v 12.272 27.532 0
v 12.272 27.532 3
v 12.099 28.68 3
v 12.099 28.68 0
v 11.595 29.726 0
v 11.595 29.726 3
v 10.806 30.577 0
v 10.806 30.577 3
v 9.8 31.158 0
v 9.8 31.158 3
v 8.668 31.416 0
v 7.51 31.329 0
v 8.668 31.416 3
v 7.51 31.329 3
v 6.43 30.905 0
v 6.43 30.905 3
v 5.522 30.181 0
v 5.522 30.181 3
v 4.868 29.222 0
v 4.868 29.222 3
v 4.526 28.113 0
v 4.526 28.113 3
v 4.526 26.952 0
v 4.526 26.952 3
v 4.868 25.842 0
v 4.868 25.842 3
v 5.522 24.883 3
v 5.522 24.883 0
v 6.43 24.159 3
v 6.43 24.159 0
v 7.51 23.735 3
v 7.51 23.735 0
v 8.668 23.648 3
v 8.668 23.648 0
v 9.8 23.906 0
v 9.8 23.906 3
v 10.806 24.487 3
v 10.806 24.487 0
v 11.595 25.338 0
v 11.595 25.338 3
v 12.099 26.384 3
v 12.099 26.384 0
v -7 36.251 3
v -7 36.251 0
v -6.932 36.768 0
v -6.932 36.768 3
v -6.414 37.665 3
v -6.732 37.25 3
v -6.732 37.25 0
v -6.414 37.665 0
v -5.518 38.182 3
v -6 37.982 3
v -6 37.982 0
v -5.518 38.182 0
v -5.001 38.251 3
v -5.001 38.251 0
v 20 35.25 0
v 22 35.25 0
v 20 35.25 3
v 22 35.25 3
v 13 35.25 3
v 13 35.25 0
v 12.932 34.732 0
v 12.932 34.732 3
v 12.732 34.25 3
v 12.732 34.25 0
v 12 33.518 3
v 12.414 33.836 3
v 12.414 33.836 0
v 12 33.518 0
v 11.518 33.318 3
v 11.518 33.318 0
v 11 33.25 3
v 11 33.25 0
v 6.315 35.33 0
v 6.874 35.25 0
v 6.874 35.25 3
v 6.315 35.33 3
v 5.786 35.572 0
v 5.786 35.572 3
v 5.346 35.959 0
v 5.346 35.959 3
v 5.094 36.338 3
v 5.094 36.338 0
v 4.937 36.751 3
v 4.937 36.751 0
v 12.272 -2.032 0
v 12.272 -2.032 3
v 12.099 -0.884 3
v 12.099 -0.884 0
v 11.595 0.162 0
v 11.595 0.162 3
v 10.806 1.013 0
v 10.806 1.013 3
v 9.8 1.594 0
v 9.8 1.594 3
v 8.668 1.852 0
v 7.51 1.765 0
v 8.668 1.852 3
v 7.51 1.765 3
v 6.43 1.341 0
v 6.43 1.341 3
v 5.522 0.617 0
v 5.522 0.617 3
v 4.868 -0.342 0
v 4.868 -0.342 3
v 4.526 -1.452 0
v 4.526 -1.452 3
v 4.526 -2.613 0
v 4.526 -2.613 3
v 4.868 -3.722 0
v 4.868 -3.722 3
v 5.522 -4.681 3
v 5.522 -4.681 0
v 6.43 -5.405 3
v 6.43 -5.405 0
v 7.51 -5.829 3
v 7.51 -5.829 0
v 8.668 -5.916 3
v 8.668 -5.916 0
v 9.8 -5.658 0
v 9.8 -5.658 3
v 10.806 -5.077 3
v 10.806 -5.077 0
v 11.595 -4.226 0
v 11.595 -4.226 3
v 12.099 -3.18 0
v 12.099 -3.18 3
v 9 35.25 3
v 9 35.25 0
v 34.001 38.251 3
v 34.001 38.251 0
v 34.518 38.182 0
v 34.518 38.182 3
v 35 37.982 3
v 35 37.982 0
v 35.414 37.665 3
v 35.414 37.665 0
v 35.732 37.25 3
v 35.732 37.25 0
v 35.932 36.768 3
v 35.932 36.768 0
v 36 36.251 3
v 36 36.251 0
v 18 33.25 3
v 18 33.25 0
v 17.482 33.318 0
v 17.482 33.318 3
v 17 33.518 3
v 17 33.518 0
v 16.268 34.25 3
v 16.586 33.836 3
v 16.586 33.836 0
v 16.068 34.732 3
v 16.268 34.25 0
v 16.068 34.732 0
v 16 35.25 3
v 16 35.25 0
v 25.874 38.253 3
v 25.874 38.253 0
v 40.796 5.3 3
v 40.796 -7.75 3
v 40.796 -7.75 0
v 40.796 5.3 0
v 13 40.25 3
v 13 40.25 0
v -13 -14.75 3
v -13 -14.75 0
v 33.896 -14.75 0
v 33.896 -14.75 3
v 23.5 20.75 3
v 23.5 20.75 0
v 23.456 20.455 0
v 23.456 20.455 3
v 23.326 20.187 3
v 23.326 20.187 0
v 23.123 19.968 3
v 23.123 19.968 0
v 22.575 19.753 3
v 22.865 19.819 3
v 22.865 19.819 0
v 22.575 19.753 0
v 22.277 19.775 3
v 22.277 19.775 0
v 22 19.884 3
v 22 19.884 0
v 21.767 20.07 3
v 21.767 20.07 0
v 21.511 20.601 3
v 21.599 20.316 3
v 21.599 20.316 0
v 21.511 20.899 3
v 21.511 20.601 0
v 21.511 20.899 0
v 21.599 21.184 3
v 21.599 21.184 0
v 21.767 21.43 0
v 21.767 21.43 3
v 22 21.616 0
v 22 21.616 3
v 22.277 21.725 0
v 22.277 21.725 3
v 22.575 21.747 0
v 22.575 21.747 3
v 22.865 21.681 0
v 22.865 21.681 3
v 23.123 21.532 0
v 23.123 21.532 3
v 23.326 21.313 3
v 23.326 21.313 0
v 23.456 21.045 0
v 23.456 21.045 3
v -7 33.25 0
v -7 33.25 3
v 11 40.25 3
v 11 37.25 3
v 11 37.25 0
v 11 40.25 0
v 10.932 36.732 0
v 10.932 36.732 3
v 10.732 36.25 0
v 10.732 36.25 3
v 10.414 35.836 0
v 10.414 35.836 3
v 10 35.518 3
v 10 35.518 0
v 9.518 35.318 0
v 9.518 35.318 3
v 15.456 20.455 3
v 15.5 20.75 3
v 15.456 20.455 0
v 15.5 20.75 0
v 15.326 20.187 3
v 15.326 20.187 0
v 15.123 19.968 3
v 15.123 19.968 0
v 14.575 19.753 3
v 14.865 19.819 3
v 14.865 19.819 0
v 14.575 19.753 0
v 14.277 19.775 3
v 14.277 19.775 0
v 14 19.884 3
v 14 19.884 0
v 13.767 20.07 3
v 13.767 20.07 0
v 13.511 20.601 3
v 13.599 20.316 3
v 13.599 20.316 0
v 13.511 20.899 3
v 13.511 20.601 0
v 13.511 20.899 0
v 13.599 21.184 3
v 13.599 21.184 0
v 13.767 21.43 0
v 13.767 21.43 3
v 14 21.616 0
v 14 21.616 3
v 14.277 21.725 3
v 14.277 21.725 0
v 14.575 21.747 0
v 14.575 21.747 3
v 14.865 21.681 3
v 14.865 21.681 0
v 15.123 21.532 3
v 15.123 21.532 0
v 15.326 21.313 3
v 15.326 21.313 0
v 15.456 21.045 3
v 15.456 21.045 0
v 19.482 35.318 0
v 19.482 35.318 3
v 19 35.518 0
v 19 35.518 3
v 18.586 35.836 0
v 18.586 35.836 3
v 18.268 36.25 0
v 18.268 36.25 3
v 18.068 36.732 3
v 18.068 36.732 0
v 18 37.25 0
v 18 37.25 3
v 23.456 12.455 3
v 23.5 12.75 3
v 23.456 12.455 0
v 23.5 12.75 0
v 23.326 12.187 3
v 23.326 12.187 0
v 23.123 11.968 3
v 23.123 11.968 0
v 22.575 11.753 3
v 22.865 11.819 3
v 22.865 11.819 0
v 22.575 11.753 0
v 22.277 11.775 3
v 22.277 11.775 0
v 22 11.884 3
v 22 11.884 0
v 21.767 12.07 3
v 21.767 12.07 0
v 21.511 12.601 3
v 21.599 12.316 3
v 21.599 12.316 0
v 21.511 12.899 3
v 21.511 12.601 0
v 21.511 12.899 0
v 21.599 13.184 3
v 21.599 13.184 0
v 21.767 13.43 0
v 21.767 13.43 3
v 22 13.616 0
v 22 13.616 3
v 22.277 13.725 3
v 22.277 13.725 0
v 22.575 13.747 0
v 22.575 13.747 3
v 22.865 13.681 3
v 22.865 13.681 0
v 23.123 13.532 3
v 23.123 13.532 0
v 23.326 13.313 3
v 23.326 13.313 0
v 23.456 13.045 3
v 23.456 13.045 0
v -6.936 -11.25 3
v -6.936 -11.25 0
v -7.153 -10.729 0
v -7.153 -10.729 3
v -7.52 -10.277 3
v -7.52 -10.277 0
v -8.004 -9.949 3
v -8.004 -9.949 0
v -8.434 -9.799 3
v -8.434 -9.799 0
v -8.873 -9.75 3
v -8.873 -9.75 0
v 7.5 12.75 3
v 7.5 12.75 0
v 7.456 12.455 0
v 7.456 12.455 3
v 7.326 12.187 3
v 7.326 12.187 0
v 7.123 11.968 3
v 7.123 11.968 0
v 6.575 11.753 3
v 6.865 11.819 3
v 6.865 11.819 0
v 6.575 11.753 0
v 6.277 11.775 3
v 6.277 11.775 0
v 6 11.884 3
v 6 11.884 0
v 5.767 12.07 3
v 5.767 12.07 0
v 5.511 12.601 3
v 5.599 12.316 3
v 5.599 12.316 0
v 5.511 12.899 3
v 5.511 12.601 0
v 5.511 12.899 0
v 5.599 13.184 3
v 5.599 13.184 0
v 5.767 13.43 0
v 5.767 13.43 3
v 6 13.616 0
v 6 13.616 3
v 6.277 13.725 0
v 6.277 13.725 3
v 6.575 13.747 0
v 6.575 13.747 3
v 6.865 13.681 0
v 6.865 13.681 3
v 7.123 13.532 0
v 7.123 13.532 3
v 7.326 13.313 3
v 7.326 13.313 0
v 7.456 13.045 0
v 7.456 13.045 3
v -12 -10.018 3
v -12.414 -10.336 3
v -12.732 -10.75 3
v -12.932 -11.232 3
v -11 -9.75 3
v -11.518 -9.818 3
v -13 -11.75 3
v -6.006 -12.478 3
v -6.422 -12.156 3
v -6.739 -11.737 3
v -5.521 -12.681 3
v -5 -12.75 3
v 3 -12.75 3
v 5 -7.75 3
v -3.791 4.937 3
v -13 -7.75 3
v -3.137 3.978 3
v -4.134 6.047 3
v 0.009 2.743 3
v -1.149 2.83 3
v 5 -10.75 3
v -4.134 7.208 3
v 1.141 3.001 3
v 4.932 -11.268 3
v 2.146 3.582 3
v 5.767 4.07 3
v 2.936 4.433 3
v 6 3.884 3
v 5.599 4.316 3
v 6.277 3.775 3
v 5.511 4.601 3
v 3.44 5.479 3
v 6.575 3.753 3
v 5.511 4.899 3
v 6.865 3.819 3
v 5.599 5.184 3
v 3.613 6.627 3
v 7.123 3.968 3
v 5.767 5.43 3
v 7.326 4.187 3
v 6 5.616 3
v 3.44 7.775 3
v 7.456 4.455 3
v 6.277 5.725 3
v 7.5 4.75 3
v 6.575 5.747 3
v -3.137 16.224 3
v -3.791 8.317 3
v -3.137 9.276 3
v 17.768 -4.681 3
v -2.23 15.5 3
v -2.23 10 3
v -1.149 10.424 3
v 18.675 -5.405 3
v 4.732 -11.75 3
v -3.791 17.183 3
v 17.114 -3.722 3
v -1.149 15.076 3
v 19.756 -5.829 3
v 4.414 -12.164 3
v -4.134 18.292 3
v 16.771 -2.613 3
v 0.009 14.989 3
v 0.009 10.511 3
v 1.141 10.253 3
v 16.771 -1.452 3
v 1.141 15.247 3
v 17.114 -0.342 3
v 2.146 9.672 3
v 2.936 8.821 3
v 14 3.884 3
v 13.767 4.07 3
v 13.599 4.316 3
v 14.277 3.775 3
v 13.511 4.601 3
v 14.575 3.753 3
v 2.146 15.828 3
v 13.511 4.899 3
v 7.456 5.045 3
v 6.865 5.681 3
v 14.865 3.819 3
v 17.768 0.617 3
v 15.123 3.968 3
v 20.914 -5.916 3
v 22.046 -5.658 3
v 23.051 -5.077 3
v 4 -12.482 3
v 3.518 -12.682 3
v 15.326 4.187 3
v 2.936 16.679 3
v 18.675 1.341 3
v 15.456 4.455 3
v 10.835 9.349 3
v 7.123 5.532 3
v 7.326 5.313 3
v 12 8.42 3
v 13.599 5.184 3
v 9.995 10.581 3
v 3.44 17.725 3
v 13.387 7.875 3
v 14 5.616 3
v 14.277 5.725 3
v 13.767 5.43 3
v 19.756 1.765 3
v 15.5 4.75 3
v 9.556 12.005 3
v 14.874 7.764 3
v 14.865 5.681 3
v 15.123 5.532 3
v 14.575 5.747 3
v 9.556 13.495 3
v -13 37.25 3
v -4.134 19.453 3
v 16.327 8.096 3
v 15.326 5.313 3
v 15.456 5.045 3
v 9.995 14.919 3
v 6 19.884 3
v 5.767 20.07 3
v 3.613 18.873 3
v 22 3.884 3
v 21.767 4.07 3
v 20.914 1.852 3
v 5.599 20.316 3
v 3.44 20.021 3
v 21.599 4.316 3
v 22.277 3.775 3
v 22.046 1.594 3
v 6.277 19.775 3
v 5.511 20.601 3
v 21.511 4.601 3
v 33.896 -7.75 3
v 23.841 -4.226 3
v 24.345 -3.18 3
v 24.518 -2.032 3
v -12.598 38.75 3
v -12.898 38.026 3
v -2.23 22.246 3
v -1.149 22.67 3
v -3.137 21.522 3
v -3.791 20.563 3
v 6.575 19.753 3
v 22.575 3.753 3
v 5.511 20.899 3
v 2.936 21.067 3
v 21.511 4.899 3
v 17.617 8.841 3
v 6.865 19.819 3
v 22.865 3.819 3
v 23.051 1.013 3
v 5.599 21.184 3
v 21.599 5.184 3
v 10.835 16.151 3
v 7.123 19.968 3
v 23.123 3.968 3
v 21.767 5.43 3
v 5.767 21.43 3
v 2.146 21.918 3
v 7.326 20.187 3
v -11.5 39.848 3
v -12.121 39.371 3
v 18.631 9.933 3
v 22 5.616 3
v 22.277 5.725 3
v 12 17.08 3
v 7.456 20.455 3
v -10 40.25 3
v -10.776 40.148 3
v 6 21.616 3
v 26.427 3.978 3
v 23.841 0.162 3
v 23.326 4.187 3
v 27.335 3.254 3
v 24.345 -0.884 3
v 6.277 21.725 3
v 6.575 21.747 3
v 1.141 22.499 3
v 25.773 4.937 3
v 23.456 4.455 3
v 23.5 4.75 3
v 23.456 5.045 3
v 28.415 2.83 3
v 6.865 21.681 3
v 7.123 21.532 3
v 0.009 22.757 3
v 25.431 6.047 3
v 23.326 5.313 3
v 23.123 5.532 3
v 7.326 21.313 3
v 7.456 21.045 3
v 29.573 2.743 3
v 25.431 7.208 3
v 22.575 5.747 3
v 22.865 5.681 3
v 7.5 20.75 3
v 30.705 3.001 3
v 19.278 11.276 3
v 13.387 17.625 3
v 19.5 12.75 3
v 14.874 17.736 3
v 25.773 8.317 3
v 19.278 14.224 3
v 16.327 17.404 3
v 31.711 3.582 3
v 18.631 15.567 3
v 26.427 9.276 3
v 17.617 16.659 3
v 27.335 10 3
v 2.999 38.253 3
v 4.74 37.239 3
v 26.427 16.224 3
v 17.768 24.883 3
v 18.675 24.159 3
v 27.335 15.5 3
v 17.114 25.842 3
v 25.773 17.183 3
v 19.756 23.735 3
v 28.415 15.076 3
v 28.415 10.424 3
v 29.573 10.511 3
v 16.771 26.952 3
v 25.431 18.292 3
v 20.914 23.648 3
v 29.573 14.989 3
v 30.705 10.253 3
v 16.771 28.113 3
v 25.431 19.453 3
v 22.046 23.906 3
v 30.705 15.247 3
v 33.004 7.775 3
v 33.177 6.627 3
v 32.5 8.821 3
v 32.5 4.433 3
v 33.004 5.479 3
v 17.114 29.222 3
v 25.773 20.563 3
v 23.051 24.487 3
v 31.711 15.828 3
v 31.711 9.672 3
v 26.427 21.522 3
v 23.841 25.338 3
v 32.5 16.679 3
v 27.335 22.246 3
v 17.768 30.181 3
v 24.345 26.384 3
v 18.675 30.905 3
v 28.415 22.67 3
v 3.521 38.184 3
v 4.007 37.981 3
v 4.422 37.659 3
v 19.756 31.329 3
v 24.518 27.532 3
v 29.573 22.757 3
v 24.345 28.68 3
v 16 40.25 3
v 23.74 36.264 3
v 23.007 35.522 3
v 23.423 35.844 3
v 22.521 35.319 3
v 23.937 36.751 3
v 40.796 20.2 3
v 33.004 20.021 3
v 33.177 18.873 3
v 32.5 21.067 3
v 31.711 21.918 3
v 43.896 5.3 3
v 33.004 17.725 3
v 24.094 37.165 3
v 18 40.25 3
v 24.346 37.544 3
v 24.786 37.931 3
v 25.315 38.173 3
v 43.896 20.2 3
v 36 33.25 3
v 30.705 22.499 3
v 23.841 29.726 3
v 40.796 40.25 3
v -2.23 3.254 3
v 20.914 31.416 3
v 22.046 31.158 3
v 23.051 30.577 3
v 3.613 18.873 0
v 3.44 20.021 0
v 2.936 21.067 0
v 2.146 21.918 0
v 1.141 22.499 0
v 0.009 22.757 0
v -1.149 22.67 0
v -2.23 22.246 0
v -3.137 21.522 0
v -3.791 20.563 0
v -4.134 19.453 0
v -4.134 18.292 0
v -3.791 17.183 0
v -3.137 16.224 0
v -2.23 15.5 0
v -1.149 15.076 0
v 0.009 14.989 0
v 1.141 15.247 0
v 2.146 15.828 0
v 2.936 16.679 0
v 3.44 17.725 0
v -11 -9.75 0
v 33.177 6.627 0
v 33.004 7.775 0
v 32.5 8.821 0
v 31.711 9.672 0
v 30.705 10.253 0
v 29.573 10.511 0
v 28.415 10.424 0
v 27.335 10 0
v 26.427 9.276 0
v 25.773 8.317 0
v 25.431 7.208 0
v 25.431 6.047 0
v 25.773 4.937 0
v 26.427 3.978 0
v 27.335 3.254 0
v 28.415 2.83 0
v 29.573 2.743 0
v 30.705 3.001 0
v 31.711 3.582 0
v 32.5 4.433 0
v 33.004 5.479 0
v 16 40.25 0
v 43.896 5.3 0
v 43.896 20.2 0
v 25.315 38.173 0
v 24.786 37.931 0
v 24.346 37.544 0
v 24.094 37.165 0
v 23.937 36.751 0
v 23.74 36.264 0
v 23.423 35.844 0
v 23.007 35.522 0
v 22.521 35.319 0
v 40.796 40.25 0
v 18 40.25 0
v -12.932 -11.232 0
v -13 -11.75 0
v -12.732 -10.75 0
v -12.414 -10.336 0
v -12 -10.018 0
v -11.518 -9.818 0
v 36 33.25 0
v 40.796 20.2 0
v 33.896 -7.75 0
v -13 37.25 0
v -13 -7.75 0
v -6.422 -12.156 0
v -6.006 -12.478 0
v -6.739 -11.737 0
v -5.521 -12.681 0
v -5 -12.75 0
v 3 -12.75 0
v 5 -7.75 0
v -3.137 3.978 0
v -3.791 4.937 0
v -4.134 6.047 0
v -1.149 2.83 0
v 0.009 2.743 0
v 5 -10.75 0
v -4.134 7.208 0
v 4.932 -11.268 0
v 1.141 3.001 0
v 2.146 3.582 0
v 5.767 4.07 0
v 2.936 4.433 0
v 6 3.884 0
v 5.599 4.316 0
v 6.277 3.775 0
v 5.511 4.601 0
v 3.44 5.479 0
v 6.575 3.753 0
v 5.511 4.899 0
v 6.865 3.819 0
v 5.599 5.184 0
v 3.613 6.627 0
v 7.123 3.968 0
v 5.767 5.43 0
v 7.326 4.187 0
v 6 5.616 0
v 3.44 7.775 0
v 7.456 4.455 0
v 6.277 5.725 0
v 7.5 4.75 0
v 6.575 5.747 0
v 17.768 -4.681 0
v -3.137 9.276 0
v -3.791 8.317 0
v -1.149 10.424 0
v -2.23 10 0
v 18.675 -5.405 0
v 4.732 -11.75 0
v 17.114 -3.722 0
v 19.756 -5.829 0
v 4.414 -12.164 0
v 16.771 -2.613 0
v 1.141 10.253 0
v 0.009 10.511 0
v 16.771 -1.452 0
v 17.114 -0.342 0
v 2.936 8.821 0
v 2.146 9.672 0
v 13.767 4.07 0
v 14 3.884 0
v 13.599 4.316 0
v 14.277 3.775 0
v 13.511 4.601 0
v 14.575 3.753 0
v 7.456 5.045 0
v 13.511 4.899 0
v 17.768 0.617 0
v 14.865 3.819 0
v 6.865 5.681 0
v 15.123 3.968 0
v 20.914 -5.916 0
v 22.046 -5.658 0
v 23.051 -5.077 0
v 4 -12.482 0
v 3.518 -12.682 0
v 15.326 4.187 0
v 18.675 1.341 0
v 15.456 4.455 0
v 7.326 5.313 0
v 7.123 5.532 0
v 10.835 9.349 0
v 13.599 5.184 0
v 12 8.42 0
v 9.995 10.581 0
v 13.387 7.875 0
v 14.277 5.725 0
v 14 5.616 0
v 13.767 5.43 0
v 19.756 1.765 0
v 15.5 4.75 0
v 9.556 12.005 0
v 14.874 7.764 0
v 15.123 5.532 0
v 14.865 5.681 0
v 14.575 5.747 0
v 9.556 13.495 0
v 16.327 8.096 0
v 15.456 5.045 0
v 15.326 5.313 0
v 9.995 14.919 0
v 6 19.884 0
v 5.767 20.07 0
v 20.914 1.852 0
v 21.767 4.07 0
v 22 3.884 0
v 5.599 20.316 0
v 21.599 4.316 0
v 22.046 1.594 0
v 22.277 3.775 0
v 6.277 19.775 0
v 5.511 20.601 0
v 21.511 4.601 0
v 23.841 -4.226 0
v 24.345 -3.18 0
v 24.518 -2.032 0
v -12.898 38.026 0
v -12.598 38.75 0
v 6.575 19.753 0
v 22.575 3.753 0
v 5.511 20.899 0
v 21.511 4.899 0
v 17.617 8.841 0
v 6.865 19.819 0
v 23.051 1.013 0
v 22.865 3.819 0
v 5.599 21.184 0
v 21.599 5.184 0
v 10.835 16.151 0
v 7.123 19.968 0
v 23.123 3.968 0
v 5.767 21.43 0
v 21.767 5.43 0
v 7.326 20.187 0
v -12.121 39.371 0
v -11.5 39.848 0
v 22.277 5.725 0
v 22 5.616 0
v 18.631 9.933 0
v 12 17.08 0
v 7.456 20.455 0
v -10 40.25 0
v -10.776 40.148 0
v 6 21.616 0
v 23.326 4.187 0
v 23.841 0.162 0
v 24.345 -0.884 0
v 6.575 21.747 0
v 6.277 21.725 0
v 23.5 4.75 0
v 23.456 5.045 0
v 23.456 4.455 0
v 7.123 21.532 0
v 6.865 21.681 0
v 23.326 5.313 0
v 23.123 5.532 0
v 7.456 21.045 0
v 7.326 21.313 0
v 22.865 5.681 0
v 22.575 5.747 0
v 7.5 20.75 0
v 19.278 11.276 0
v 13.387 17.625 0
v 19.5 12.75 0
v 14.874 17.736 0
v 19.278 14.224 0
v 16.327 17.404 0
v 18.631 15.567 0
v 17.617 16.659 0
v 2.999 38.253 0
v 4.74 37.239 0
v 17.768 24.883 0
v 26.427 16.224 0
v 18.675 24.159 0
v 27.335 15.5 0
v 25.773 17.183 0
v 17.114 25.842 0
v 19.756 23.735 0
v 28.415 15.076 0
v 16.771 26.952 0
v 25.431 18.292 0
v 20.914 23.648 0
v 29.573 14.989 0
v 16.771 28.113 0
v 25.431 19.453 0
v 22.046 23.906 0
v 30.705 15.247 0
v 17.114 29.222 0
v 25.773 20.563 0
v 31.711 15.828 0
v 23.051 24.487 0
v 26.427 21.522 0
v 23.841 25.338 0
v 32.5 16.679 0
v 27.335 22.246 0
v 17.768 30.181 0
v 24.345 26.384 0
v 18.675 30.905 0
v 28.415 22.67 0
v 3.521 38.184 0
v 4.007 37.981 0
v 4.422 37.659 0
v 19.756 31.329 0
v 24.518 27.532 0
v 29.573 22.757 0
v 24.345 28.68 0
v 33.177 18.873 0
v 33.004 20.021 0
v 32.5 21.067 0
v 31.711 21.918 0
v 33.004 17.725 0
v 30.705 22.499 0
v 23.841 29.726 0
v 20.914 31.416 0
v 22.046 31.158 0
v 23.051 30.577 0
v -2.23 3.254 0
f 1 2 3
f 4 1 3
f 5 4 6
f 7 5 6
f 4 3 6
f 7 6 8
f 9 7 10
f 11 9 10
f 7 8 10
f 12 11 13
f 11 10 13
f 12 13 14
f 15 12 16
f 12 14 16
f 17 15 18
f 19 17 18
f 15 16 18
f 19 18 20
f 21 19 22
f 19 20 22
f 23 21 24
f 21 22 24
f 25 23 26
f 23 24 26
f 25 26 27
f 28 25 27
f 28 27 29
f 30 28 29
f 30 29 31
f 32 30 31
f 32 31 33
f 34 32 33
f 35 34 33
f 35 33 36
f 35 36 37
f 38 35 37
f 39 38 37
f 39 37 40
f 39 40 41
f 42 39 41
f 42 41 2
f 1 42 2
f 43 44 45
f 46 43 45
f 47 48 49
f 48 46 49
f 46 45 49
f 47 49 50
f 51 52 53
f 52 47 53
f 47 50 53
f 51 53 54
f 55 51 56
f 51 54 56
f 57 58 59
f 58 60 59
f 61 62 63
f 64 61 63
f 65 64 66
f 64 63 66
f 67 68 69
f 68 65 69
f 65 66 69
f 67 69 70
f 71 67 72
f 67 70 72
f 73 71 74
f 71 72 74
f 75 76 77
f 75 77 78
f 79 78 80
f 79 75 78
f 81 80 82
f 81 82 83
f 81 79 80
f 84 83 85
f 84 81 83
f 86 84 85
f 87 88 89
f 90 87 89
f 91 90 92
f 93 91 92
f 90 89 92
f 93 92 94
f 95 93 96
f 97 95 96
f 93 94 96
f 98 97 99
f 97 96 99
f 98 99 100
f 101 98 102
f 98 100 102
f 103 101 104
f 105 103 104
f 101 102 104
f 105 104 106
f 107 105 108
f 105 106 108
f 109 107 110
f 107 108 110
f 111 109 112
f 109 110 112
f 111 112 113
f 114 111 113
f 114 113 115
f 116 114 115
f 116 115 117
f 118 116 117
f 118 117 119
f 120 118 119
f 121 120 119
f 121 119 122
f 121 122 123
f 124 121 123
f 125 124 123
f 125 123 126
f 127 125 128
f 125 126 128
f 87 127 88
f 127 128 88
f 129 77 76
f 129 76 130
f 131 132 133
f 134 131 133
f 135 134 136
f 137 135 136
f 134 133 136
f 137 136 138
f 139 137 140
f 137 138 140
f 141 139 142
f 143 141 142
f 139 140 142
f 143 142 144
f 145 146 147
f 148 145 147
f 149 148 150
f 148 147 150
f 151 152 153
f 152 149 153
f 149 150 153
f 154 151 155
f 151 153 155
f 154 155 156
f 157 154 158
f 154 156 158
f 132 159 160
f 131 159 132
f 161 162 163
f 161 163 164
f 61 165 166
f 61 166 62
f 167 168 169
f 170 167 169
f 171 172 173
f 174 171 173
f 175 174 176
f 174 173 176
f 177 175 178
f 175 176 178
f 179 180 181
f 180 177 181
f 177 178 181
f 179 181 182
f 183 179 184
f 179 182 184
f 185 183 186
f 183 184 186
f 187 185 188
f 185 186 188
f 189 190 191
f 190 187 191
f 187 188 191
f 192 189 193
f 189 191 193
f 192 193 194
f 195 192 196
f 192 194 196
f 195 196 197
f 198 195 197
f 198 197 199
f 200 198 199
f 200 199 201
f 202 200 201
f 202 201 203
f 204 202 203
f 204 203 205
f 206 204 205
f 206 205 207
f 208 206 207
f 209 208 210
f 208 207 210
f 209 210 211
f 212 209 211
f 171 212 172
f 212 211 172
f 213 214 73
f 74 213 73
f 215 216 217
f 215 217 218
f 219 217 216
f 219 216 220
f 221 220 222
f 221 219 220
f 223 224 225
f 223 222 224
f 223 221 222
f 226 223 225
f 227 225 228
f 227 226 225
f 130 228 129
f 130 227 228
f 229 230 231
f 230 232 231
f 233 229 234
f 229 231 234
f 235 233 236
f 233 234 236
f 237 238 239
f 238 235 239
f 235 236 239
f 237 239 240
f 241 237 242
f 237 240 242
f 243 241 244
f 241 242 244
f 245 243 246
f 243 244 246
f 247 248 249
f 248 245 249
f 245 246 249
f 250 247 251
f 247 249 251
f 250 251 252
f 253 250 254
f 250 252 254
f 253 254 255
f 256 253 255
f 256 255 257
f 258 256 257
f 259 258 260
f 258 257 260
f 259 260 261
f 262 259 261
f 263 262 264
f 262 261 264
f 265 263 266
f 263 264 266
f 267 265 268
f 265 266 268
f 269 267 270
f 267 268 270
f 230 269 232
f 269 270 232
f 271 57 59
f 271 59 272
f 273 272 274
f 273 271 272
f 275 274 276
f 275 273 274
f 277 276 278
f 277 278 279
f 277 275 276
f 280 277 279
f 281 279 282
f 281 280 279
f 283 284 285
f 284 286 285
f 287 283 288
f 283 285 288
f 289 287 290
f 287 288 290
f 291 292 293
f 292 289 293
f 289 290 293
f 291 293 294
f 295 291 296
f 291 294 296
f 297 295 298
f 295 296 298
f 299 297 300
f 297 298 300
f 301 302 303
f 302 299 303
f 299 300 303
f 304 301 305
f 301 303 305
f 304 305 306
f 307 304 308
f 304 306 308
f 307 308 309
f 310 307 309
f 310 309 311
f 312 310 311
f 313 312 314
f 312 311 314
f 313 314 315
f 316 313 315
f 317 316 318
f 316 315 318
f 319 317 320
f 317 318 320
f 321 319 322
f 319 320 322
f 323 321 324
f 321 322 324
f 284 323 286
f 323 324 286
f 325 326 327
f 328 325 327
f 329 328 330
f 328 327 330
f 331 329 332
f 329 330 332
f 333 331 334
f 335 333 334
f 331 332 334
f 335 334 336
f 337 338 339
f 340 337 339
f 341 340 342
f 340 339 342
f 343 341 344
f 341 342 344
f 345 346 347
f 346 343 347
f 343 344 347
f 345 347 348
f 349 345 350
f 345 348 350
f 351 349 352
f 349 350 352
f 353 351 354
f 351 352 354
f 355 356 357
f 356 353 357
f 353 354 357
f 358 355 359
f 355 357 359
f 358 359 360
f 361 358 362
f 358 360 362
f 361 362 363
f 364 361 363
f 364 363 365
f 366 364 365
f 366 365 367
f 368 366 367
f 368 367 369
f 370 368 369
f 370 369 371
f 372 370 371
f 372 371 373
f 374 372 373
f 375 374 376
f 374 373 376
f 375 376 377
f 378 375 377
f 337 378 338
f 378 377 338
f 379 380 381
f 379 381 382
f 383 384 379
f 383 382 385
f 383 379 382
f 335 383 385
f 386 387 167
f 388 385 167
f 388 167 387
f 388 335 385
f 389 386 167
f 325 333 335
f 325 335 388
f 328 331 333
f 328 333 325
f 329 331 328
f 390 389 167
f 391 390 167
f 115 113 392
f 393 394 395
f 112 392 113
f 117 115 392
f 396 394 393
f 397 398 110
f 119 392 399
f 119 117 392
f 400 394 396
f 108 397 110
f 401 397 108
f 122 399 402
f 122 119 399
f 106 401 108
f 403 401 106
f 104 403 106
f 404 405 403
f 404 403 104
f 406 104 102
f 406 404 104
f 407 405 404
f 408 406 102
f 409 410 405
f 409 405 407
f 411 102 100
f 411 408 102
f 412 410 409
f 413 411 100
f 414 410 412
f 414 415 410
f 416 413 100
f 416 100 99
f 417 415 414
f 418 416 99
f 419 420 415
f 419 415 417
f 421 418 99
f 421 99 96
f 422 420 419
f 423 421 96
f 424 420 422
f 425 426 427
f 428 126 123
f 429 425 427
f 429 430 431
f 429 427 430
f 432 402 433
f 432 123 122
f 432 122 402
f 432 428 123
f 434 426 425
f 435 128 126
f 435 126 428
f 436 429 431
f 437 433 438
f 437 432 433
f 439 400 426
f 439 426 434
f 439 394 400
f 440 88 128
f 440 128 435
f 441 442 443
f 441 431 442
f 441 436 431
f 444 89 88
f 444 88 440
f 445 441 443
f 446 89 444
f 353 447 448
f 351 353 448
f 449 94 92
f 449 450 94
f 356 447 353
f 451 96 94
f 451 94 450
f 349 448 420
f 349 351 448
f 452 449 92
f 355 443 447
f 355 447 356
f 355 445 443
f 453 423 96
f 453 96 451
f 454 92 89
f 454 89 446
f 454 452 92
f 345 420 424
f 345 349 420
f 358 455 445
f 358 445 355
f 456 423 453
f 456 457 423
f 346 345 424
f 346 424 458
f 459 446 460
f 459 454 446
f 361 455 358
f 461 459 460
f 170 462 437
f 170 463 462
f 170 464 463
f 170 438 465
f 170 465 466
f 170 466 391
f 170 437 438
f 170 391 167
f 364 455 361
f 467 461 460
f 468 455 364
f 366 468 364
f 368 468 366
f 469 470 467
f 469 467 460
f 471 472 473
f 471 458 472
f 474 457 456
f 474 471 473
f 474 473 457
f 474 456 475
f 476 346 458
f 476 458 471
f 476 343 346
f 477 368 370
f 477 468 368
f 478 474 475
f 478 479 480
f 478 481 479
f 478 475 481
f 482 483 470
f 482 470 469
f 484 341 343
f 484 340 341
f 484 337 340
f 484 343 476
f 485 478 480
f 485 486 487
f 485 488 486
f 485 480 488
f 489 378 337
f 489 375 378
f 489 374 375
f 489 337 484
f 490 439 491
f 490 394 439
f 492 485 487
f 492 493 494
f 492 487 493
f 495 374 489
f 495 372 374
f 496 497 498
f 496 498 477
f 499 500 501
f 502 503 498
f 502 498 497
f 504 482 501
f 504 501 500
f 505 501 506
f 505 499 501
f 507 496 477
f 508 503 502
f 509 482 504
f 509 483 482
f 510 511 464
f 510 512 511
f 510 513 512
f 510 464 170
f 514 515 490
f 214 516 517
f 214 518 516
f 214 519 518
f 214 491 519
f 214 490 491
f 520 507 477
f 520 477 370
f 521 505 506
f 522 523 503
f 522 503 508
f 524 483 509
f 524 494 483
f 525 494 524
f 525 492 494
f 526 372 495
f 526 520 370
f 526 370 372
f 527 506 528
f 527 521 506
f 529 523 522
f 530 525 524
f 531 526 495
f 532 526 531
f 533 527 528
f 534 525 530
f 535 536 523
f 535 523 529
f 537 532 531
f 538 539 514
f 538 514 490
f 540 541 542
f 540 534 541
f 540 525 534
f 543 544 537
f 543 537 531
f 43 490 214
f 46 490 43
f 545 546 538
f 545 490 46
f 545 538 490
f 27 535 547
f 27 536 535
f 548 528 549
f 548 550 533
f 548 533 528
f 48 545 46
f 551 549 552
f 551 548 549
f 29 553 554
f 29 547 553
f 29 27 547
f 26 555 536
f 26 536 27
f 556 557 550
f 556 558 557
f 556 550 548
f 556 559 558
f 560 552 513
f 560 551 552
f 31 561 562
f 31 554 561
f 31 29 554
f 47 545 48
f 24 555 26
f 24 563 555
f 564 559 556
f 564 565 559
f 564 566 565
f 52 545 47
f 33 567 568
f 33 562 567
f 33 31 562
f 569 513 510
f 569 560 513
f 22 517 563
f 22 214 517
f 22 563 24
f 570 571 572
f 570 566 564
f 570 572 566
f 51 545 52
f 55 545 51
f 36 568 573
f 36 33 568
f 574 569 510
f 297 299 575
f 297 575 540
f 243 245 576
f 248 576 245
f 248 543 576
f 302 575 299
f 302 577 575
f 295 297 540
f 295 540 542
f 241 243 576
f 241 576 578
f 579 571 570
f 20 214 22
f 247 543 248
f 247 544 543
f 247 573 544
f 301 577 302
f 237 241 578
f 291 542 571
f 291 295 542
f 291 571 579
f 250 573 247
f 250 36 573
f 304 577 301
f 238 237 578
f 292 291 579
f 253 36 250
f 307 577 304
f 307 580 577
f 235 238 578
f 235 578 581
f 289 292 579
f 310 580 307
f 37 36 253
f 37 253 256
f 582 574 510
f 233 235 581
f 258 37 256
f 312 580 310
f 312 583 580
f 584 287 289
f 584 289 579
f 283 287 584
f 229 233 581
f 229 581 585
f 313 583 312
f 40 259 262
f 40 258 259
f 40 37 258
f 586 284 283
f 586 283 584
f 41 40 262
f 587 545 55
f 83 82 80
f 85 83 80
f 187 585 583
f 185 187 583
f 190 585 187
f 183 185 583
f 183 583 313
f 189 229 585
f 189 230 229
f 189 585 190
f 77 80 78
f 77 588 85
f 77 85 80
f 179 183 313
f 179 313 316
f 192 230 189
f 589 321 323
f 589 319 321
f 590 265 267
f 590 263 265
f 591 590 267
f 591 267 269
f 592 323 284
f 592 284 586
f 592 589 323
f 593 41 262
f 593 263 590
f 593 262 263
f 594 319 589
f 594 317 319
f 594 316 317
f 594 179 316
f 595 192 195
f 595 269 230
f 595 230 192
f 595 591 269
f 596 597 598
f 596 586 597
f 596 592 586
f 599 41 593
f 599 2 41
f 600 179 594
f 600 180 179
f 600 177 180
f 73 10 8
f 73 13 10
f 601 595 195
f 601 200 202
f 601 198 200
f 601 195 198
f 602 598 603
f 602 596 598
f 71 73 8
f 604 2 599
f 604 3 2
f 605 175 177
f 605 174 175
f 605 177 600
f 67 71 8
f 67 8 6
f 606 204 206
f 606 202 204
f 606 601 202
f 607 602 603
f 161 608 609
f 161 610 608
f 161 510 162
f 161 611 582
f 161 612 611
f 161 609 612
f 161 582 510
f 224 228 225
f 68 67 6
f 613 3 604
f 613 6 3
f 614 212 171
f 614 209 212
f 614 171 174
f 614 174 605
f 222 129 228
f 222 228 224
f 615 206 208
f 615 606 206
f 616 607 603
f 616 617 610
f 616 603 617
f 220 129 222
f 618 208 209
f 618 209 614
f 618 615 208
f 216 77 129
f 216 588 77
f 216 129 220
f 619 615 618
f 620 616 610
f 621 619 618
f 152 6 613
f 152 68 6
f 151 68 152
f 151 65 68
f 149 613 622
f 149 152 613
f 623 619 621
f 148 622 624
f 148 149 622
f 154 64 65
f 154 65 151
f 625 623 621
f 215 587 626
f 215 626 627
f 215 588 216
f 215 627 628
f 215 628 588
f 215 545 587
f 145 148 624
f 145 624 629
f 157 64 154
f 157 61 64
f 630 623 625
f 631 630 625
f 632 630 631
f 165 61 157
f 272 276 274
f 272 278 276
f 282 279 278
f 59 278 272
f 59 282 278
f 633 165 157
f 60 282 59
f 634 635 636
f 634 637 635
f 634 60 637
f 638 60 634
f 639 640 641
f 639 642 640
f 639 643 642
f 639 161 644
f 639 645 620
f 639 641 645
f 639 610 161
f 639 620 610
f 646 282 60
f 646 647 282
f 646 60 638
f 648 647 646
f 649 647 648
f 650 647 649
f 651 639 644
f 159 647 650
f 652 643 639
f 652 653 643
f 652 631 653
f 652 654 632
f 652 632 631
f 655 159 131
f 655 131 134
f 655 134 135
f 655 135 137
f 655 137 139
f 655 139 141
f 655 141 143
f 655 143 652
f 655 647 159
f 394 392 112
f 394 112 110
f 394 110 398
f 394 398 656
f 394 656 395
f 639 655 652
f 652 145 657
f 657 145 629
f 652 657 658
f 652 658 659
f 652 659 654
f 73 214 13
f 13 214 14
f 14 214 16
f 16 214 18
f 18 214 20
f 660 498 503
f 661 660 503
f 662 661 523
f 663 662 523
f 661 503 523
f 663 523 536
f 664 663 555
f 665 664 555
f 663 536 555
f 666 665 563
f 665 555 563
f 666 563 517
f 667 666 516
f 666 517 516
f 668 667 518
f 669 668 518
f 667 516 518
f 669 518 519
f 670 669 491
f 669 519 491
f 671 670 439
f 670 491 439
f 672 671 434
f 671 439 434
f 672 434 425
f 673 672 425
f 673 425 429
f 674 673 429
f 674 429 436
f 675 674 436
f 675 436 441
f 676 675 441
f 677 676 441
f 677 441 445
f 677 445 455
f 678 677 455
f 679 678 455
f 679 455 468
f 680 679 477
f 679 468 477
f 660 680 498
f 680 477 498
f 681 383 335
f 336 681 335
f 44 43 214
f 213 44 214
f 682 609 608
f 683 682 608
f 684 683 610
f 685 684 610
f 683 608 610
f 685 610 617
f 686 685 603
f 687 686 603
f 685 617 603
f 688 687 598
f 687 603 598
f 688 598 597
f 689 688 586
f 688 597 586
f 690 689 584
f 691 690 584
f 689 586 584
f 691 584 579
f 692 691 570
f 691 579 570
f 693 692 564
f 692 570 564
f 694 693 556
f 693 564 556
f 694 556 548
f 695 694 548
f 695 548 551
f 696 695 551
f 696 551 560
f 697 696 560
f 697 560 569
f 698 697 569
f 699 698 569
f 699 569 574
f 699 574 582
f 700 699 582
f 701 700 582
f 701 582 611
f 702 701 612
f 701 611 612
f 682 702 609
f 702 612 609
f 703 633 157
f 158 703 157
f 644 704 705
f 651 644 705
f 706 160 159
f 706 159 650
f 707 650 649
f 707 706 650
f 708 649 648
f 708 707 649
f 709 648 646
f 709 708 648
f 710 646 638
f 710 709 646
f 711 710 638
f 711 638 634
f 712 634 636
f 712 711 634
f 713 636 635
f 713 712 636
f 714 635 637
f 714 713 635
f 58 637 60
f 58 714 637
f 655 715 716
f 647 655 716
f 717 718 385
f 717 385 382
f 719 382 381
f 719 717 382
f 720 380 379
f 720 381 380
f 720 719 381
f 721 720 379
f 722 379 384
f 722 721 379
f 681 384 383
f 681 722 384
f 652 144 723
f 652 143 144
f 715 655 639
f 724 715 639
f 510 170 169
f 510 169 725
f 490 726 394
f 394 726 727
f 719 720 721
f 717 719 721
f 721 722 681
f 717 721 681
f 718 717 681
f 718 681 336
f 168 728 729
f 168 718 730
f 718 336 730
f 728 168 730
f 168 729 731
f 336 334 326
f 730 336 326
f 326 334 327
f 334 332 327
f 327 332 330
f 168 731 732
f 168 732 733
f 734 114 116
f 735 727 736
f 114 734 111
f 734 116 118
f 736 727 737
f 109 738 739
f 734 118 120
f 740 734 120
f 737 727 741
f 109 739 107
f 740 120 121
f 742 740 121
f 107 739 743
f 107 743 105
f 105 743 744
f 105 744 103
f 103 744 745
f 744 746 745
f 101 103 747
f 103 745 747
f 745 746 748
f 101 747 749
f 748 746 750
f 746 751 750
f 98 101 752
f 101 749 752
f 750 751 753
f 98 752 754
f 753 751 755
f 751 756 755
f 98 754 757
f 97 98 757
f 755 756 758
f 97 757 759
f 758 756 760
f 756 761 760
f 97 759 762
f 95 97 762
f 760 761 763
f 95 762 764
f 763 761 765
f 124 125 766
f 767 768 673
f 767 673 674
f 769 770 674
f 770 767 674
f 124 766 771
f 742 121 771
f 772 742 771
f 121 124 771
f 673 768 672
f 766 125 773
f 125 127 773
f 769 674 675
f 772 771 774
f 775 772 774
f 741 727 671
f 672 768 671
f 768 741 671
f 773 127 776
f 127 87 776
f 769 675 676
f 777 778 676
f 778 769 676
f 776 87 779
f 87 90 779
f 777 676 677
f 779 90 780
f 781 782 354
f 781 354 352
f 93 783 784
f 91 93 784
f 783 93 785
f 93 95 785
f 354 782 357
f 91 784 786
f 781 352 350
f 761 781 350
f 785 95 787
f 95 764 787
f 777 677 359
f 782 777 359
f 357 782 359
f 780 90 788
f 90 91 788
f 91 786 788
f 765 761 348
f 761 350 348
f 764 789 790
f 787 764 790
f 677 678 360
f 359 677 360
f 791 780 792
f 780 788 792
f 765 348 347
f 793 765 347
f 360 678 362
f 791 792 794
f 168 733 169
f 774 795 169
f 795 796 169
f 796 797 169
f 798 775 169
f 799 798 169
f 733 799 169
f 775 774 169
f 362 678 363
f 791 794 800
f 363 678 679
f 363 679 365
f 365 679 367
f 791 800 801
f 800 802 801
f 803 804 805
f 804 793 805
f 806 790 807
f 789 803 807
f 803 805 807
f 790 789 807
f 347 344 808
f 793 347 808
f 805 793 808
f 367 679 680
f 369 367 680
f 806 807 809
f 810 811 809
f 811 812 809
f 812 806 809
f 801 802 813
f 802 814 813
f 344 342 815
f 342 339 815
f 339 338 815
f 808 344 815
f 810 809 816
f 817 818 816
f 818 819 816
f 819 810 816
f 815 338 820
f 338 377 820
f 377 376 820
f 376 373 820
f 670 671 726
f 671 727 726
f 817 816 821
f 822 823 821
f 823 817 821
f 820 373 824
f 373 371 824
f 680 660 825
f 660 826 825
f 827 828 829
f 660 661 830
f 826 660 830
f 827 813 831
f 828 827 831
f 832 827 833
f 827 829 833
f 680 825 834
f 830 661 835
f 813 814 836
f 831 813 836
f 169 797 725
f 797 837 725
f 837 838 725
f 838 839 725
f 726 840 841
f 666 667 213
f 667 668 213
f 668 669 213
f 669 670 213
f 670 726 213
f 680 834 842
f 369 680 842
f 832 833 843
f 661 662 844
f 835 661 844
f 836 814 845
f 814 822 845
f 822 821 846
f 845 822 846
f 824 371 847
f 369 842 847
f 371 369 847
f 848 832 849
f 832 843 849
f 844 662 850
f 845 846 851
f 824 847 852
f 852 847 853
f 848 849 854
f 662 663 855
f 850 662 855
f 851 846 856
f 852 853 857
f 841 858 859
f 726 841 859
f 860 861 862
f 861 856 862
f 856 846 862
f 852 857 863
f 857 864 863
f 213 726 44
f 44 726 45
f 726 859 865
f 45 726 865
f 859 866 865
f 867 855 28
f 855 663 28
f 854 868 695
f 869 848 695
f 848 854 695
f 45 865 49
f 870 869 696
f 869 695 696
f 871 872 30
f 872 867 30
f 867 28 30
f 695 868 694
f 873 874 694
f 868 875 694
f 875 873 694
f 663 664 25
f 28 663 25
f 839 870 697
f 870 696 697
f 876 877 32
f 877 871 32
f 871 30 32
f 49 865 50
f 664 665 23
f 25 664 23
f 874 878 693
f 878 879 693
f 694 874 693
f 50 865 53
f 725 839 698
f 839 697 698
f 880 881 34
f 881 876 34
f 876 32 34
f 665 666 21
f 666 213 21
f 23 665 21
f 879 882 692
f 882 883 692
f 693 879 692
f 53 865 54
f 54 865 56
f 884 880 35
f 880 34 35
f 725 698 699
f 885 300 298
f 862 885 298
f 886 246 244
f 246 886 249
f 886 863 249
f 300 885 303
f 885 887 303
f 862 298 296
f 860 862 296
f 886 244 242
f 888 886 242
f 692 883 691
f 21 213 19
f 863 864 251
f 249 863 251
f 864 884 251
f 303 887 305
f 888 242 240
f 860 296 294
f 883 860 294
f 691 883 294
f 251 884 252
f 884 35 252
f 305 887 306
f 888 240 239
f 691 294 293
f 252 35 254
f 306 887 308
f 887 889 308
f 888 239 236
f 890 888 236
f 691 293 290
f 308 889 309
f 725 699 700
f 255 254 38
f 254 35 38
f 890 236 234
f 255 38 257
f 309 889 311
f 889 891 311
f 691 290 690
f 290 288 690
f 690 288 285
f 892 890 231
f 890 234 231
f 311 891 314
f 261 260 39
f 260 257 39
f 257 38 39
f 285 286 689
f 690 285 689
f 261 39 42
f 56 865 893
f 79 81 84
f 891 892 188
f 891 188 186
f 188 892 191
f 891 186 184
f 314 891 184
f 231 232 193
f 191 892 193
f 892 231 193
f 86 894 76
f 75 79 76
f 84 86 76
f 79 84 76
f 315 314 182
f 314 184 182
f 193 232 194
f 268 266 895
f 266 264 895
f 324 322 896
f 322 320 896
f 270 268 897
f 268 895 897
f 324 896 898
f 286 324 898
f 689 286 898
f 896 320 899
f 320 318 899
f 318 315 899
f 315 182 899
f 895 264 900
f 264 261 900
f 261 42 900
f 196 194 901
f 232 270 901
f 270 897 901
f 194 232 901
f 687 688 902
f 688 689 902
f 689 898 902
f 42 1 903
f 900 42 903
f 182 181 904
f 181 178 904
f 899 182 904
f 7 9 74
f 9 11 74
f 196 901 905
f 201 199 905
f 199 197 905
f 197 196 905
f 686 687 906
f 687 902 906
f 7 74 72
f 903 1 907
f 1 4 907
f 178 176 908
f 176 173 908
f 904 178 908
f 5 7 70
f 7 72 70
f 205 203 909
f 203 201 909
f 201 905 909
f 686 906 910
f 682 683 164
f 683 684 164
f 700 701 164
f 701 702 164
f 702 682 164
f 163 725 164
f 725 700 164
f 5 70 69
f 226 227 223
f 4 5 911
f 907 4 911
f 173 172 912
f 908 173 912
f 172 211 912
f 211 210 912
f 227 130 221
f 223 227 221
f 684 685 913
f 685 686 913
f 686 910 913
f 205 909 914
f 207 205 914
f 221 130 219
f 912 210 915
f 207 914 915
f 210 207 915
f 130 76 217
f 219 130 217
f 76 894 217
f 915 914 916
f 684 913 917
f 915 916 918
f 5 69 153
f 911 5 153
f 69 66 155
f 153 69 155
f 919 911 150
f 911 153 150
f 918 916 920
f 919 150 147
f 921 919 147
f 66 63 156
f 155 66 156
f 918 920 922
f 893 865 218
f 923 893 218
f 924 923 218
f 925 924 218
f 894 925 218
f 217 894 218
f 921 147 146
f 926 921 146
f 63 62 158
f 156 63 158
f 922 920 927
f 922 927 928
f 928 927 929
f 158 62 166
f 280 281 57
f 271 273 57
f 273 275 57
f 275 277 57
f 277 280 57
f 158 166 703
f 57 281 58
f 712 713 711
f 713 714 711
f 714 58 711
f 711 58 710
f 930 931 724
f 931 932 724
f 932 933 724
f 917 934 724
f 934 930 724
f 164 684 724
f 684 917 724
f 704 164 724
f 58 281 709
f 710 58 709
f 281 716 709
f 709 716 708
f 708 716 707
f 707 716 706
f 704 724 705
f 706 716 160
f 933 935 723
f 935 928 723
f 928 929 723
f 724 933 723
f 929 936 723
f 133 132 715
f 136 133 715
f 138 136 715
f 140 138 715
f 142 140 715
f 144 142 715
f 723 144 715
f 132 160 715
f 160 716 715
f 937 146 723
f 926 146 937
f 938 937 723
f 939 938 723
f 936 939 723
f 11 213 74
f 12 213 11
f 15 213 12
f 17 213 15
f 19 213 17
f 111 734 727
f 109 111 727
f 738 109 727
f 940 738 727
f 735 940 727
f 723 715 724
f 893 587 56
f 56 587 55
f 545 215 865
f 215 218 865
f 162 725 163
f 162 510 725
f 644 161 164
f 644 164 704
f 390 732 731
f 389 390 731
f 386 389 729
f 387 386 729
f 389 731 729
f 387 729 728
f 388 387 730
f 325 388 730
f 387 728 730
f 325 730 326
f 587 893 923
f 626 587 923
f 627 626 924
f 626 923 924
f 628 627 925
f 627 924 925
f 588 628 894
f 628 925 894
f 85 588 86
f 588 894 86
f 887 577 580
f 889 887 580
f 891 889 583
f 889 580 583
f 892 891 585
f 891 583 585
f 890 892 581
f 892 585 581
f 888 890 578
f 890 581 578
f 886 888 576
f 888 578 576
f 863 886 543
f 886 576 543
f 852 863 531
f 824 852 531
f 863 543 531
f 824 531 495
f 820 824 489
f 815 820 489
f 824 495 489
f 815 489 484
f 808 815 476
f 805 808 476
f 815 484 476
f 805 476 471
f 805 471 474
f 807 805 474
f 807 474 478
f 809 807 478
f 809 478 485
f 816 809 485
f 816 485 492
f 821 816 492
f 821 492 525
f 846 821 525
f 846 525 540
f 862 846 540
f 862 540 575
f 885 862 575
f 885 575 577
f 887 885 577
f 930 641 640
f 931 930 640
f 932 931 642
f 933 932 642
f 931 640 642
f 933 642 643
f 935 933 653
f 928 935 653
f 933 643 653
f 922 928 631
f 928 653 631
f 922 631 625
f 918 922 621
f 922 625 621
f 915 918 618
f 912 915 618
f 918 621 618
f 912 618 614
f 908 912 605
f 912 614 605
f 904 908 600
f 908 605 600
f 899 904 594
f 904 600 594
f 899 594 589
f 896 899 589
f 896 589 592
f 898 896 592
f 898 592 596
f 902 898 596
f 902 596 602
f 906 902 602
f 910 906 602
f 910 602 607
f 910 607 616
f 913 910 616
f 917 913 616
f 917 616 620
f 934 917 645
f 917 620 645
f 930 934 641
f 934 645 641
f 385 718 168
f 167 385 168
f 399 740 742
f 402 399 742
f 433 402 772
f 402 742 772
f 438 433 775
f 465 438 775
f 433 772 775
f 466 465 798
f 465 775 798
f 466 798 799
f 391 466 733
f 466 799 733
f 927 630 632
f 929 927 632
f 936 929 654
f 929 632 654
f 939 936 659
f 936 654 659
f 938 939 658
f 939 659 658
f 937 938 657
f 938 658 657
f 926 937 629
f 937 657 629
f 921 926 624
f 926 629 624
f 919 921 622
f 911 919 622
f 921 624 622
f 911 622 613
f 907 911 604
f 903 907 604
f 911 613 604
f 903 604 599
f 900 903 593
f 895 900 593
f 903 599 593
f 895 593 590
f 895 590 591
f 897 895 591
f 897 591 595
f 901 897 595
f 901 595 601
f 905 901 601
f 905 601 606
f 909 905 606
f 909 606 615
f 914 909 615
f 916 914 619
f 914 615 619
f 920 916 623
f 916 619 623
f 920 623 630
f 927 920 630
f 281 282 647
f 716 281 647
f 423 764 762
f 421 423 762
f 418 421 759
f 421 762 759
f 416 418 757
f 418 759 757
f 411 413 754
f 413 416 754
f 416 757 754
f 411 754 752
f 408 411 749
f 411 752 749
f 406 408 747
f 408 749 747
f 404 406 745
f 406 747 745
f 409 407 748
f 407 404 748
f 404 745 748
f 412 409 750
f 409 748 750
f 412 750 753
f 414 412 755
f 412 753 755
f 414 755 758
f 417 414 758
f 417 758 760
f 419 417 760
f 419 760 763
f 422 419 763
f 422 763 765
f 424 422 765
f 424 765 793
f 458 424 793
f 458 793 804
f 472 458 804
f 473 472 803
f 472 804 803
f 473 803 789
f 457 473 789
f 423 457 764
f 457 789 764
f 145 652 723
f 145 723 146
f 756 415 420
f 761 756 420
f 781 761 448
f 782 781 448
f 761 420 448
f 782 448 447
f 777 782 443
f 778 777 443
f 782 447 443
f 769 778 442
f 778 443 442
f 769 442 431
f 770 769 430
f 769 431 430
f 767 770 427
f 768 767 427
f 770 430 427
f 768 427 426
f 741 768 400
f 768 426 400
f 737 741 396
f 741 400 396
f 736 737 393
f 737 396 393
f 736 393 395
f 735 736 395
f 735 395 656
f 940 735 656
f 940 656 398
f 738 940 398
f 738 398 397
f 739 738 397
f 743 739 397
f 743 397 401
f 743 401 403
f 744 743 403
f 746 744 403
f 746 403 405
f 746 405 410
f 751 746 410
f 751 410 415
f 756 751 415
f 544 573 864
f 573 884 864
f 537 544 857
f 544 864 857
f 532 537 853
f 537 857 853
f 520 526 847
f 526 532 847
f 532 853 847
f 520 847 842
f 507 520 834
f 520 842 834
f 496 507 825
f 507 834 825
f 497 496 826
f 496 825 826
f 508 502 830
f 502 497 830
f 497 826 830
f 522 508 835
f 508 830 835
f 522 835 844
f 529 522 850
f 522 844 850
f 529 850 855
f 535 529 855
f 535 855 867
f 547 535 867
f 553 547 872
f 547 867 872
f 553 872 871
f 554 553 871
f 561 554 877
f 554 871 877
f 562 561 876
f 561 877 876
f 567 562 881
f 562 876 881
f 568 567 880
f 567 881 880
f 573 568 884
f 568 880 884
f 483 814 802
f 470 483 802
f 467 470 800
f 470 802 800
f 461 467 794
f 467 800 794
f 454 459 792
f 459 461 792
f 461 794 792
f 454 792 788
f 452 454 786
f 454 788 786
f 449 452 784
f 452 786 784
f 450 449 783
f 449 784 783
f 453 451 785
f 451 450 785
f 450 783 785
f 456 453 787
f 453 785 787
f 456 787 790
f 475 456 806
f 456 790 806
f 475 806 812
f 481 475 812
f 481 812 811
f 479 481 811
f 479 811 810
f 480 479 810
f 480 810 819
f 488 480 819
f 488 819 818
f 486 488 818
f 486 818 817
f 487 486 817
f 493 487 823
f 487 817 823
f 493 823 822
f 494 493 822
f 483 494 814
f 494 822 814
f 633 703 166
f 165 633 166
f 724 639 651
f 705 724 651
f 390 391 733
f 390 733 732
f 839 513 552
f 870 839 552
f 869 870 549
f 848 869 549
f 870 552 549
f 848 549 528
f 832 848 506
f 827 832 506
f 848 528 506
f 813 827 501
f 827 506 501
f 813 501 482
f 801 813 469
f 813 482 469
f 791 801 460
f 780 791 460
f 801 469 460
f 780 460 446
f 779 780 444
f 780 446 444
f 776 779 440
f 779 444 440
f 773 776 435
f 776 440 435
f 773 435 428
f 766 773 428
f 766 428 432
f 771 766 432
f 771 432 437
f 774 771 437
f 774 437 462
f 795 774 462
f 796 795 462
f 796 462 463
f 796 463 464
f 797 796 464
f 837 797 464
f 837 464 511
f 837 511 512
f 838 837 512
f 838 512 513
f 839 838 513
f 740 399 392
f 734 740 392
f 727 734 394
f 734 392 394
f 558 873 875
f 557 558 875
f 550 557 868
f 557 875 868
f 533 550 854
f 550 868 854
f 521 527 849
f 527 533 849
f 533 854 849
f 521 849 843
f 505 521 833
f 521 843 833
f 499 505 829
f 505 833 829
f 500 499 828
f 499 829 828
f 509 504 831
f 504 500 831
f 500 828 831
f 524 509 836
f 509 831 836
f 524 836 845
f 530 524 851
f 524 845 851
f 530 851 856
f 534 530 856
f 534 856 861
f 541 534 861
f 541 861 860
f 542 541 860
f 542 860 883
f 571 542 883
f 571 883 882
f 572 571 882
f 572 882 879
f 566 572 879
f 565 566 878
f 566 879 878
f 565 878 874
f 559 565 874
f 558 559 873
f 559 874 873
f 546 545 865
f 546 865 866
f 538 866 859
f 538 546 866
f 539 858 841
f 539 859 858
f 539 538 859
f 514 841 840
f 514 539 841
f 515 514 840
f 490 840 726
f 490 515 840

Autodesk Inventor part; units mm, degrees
ref_plane "YZ Plane" through (0, 0, 0) normal (1, 0, 0) x (0, 1, 0)
ref_plane "XZ Plane" through (0, 0, 0) normal (0, 1, 0) x (-1, 0, 0)
ref_plane "XY Plane" through (0, 0, 0) normal (0, 0, 1) x (1, 0, 0)
ref_plane "Work Plane1" through (0, 0, 0) normal (0, 0, 1) x (1, 0, 0)
sketch "Sketch1" plane through (0, 0, 0) normal (0, 0, 1) x (1, 0, 0)
  circle A0 centre (6.5, 20.75) radius 1
  circle A1 centre (6.5, 4.75) radius 1
  circle A2 centre (22.5, 20.75) radius 1
  circle A3 centre (22.5, 4.75) radius 1
  line L0 (-13, -14.75) -> (43.896, -14.75)
  line L1 (43.896, -14.75) -> (43.896, 40.25)
  line L2 (43.896, 40.25) -> (-13, 40.25)
  line L3 (-13, 40.25) -> (-13, -14.75)
  circle A4 centre (22.5, 12.75) radius 1 projected
  circle A5 centre (14.5, 20.75) radius 1 projected
  circle A6 centre (14.5, 4.75) radius 1 projected
  circle A7 centre (6.5, 12.75) radius 1 projected
  point P0 (0, 0)
  point P1 (14.5, 12.75)
  dimension "d1" = 55
  dimension "d102" = 29.396
  dimension "d103" = 27.5
  dimension "d107" = 2
  dimension "d108" = 2
  dimension "d109" = 2
  dimension "d110" = 2
extrude "Extrusion3" add sketch "Sketch1" along normal blind 3
sketch "Sketch4" plane through (0, 0, 3) normal (0, 0, 1) x (1, 0, 0)
  line L0 (42, 40.25) -> (-13, 40.25) construction
  line L1 (14.5, 40.25) -> (14.5, 12.75) construction
  line L2 (-13, 12.75) -> (14.5, 12.75) construction
  line L3 (42, 40.25) -> (-13, 40.25)
  line L4 (5, 38.2532) -> (-7, 38.25)
  line L5 (13, 40.25) -> (-7, 40.25)
  line L6 (-7, 38.25) -> (-7, 33.25)
  line L7 (-7, 33.25) -> (13, 33.25)
  line L8 (13, 40.25) -> (13, 33.25)
  line L9 (5, -7.75) -> (-13, -7.75)
  circle A0 centre (14.5, 12.75) radius 5
  line L10 (14.5, 12.75) -> (20.6229, 27.5321)
  line L11 (14.5, 12.75) -> (30.5, 12.75) construction
  circle A1 centre (20.6229, 27.5321) radius 3.895
  circle A2 centre (8.3771, 27.5321) radius 3.895
  circle A3 centre (-0.2821, 18.8729) radius 3.895
  circle A4 centre (-0.2821, 6.6271) radius 3.895
  circle A5 centre (8.3771, -2.0321) radius 3.895
  circle A6 centre (20.6229, -2.0321) radius 3.895
  circle A7 centre (29.2821, 6.6271) radius 3.895
  circle A8 centre (29.2821, 18.8729) radius 3.895
  line L12 (5, -12.75) -> (5, -7.75)
  line L13 (5, -12.75) -> (-7, -12.75)
  line L14 (-13, -7.75) -> (-13, -9.75)
  line L15 (-13, 40.25) -> (-13, -14.75) projected
  line L16 (-13, -9.75) -> (-7, -9.75)
  line L17 (-7, -9.75) -> (-7, -12.75)
  line L18 (-13, -14.75) -> (43.896, -14.75) projected
  line L19 (5, 38.2532) -> (5, 35.25)
  line L20 (5, 35.25) -> (11, 35.25)
  line L21 (11, 35.25) -> (11, 40.25)
  line L22 (24, 38.2532) -> (36, 38.25)
  line L23 (16, 40.25) -> (36, 40.25)
  line L24 (36, 38.25) -> (36, 33.25)
  line L25 (36, 33.25) -> (16, 33.25)
  line L26 (16, 40.25) -> (16, 33.25)
  line L27 (24, 38.2532) -> (24, 35.25)
  line L28 (24, 35.25) -> (18, 35.25)
  line L29 (18, 35.25) -> (18, 40.25)
  point P0 (0, 0)
  dimension "d66" = 20
  dimension "d105" = 10
  dimension "d111" = 16
  dimension "d112" = 67.5
  dimension "d113" = 7.79
  dimension "d116" = 360
  dimension "d119" = 12
  dimension "d120" = 2
  dimension "d121" = 5
  dimension "d122" = 2
  dimension "d123" = 18
  dimension "d124" = 2
  dimension "d125" = 5
  dimension "d126" = 2
  dimension "d127" = 2
  dimension "d128" = 6
  dimension "d129" = 12
  dimension "d130" = 6
extrude "Extrusion2" cut sketch "Sketch4" against normal through all
fillet "Fillet3" radius 2 14 edges at (-7, 38.25, 1.5) (5, 38.2532, 1.5) (13, 33.25, 1.5) (5, -12.75, 1.5) (-7, -12.75, 1.5) (-7, -9.75, 1.5) (-13, -9.75, 1.5) (5, 35.25, 1.5) (11, 35.25, 1.5) (16, 33.25, 1.5) (24, 35.25, 1.5) (18, 35.25, 1.5) (36, 38.25, 1.5) (24, 38.2532, 1.5)
sketch "Sketch6" plane through (0, 0, 3) normal (0, 0, 1) x (1, 0, 0)
  line L0 (43.896, 40.25) -> (-13, 40.25) projected
  line L1 (43.896, 40.25) -> (40.796, 40.25)
  line L2 (40.796, 40.25) -> (40.796, 20.2)
  line L3 (40.796, 20.2) -> (43.896, 20.2)
  line L4 (43.896, 20.2) -> (43.896, 40.25)
  line L5 (43.896, -14.75) -> (43.896, 40.25) construction
  line L6 (43.896, 12.75) -> (-13, 12.75) construction
  line L7 (-13, 40.25) -> (-13, -14.75) construction
  line L8 (43.896, -14.75) -> (40.796, -14.75)
  line L9 (40.796, -7.75) -> (40.796, 5.3)
  line L10 (40.796, 5.3) -> (43.896, 5.3)
  line L11 (43.896, 5.3) -> (43.896, -14.75)
  line L12 (43.896, -14.75) -> (33.896, -14.75)
  line L13 (33.896, -14.75) -> (33.896, -7.75)
  line L14 (33.896, -7.75) -> (40.796, -7.75)
  line L15 (43.896, -7.75) -> (43.896, -14.75)
  point P0 (0, 0)
  point P1 (36.3284, 40.25)
  point P2 (-13, -7.75)
  dimension "d96" = 3.1
  dimension "d97" = 20.05
  dimension "d100" = 10
  dimension "d101" = 7
extrude "Extrusion4" cut sketch "Sketch6" against normal through all
fillet "Fillet4" radius 3 1 edges at (-13, 40.25, 1.5)
equation "\"d38\" = d24"
equation "\"d24\" = 7.79"
properties part number "SideRotated"
